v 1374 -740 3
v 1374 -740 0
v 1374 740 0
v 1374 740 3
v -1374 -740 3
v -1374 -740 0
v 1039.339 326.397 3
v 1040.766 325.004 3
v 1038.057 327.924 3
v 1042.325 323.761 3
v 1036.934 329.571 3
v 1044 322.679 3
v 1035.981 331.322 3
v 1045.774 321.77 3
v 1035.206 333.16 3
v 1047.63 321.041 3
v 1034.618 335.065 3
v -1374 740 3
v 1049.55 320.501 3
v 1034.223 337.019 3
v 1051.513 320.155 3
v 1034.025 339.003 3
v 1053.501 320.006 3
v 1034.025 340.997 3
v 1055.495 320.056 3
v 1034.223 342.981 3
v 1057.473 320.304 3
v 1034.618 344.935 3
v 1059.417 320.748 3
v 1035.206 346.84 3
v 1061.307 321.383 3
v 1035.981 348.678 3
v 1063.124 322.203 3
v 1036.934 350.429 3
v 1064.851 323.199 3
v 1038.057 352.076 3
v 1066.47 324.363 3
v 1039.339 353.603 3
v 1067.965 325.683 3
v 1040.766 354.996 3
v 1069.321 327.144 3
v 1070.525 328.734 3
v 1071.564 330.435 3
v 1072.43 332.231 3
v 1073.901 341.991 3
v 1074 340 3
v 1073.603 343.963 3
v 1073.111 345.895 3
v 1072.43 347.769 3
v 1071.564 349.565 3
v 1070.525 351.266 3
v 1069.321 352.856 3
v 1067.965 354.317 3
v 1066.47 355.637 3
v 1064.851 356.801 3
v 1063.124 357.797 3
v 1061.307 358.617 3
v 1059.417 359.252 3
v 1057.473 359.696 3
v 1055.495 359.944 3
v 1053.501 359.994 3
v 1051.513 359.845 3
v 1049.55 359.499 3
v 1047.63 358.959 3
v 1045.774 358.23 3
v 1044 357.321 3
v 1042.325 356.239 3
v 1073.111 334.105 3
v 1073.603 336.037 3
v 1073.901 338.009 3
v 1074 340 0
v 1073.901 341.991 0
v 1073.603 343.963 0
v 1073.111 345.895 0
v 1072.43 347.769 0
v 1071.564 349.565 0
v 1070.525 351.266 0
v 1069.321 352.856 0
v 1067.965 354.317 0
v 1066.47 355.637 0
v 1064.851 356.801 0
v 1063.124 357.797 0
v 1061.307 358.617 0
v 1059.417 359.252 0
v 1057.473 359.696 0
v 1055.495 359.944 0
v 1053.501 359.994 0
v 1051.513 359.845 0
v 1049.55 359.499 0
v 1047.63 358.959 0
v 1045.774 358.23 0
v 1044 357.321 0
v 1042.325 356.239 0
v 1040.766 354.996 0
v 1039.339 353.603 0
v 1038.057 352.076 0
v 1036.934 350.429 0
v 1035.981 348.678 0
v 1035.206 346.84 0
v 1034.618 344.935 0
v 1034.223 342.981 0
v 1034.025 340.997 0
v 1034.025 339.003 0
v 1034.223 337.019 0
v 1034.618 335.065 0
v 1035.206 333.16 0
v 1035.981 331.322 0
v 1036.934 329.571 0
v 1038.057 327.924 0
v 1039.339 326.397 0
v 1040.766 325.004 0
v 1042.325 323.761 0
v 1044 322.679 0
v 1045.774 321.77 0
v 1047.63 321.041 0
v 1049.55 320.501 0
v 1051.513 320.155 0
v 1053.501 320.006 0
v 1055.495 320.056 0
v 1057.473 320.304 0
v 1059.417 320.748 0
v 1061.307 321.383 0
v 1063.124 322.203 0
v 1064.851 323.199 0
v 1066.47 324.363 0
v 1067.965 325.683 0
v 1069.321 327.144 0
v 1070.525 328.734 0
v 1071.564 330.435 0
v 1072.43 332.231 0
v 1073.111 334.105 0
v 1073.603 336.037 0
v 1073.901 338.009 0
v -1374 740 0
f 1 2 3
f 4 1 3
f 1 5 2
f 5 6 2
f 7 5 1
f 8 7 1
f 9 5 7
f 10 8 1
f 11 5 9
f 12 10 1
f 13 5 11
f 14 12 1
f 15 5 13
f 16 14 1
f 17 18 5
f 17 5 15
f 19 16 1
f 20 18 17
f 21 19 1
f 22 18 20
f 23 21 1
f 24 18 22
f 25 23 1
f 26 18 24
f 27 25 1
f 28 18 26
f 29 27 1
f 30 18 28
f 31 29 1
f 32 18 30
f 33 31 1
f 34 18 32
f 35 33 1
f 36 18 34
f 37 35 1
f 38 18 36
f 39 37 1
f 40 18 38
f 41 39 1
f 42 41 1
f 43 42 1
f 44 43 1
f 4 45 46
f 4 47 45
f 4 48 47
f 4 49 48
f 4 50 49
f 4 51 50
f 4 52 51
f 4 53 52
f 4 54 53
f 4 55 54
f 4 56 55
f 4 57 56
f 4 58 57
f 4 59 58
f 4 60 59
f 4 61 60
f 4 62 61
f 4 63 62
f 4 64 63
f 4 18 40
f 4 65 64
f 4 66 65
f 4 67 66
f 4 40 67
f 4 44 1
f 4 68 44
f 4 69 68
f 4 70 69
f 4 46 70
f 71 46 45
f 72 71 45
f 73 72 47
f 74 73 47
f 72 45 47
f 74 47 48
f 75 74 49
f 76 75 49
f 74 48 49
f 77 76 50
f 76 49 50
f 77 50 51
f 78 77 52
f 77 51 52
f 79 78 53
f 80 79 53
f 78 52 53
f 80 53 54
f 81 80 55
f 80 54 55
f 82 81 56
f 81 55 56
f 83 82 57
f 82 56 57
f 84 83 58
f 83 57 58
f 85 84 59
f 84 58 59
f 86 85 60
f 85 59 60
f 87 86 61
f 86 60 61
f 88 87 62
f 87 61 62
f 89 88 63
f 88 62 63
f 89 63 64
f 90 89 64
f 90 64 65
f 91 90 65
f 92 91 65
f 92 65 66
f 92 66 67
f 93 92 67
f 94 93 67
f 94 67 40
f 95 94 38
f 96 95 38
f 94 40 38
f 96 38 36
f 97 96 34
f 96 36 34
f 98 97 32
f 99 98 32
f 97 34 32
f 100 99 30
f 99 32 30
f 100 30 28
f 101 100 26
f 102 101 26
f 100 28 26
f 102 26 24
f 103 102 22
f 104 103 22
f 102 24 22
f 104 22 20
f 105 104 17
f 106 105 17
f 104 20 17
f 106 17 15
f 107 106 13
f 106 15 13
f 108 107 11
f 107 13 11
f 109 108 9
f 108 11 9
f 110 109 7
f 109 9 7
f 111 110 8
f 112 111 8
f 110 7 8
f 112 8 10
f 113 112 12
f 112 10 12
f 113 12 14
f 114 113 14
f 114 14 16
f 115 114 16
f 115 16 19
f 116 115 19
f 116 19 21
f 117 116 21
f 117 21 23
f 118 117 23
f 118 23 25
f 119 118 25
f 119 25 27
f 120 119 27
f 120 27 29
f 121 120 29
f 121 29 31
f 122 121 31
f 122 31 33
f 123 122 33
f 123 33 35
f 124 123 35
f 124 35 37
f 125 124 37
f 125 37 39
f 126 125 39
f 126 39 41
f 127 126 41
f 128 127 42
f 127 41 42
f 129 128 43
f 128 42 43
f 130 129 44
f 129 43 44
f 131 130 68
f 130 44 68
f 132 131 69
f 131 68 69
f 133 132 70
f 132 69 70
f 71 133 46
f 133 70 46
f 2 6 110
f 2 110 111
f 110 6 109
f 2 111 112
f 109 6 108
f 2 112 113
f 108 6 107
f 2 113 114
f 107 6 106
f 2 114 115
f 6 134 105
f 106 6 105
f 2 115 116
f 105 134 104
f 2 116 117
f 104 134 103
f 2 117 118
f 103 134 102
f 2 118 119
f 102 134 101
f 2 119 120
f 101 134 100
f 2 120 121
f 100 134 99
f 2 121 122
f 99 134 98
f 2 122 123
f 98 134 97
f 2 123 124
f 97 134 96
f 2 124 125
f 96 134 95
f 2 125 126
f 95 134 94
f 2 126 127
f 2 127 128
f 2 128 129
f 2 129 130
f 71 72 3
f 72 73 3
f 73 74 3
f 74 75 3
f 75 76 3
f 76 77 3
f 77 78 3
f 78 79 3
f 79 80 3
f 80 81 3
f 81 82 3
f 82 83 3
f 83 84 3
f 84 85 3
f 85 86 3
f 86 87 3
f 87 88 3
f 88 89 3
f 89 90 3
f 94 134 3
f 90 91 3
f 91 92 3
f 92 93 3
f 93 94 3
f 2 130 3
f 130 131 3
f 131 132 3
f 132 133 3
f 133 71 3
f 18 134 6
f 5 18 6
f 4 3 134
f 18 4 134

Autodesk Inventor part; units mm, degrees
ref_plane "YZ Plane" through (0, 0, 0) normal (1, 0, 0) x (0, 1, 0)
ref_plane "XZ Plane" through (0, 0, 0) normal (0, 1, 0) x (-1, 0, 0)
ref_plane "XY Plane" through (0, 0, 0) normal (0, 0, 1) x (1, 0, 0)
sketch "Sketch1" plane through (0, 0, 0) normal (0, 0, 1) x (1, 0, 0)
  line L0 (-1374, -740) -> (1374, -740)
  line L1 (1374, -740) -> (1374, 740)
  line L2 (1374, 740) -> (-1374, 740)
  line L3 (-1374, 740) -> (-1374, -740)
  line L4 (-1374, -740) -> (1374, 740) construction
  line L5 (1374, -740) -> (-1374, 740) construction
  point P0 (0, 0)
  dimension "d0" = 2748
  dimension "d1" = 1480
extrude "Plate1" add sketch "Sketch1" along normal blind 3
sketch "Sketch5" plane through (0, 0, 3) normal (0, 0, 1) x (1, 0, 0)
  line L0 (1349, 715) -> (1349, 515) construction
  line L1 (1349, 515) -> (1334, 515) construction
  line L2 (1334, 515) -> (1334, 715) construction
  line L3 (1334, 715) -> (1349, 715) construction
  line L4 (1374, 740) -> (1374, -740) projected
  line L5 (-1374, 740) -> (1374, 740) projected
  point P0 (0, 0)
  dimension "d26" = 200
  dimension "d27" = 15
  dimension "d28" = 25
  dimension "d29" = 25
mark "Mark1"
sketch "Sketch6" plane through (-1374, -740, 3) normal (0, 0, 1) x (1, 0, 0)
  circle A0 centre (2428, 1080) radius 20
  line L0 (0, 1480) -> (2748, 1480) projected
  line L1 (2748, 1480) -> (2748, 0) projected
  point P0 (1374, 740)
  dimension "d30" = 40
  dimension "d31" = 400
  dimension "d32" = 320
extrude "Extrusion2" cut sketch "Sketch6" against normal up to surface (3 mm away)
equation "\"d2\" = Thickness"
equation "\"BendReliefWidth\" = Thickness"
equation "\"BendReliefDepth\" = 0.5 * Thickness"
equation "\"CornerReliefSize\" = 4 * Thickness"
equation "\"MinimumRemnant\" = 2 * Thickness"
equation "\"TransitionRadius\" = BendRadius"
equation "\"JacobiRadiusSize\" = BendRadius"
equation "\"GapSize\" = Thickness"
equation "\"Thickness\" = 3"
equation "\"BendRadius\" = 5"
properties part number "BSH 042 board" material "09g2s"
